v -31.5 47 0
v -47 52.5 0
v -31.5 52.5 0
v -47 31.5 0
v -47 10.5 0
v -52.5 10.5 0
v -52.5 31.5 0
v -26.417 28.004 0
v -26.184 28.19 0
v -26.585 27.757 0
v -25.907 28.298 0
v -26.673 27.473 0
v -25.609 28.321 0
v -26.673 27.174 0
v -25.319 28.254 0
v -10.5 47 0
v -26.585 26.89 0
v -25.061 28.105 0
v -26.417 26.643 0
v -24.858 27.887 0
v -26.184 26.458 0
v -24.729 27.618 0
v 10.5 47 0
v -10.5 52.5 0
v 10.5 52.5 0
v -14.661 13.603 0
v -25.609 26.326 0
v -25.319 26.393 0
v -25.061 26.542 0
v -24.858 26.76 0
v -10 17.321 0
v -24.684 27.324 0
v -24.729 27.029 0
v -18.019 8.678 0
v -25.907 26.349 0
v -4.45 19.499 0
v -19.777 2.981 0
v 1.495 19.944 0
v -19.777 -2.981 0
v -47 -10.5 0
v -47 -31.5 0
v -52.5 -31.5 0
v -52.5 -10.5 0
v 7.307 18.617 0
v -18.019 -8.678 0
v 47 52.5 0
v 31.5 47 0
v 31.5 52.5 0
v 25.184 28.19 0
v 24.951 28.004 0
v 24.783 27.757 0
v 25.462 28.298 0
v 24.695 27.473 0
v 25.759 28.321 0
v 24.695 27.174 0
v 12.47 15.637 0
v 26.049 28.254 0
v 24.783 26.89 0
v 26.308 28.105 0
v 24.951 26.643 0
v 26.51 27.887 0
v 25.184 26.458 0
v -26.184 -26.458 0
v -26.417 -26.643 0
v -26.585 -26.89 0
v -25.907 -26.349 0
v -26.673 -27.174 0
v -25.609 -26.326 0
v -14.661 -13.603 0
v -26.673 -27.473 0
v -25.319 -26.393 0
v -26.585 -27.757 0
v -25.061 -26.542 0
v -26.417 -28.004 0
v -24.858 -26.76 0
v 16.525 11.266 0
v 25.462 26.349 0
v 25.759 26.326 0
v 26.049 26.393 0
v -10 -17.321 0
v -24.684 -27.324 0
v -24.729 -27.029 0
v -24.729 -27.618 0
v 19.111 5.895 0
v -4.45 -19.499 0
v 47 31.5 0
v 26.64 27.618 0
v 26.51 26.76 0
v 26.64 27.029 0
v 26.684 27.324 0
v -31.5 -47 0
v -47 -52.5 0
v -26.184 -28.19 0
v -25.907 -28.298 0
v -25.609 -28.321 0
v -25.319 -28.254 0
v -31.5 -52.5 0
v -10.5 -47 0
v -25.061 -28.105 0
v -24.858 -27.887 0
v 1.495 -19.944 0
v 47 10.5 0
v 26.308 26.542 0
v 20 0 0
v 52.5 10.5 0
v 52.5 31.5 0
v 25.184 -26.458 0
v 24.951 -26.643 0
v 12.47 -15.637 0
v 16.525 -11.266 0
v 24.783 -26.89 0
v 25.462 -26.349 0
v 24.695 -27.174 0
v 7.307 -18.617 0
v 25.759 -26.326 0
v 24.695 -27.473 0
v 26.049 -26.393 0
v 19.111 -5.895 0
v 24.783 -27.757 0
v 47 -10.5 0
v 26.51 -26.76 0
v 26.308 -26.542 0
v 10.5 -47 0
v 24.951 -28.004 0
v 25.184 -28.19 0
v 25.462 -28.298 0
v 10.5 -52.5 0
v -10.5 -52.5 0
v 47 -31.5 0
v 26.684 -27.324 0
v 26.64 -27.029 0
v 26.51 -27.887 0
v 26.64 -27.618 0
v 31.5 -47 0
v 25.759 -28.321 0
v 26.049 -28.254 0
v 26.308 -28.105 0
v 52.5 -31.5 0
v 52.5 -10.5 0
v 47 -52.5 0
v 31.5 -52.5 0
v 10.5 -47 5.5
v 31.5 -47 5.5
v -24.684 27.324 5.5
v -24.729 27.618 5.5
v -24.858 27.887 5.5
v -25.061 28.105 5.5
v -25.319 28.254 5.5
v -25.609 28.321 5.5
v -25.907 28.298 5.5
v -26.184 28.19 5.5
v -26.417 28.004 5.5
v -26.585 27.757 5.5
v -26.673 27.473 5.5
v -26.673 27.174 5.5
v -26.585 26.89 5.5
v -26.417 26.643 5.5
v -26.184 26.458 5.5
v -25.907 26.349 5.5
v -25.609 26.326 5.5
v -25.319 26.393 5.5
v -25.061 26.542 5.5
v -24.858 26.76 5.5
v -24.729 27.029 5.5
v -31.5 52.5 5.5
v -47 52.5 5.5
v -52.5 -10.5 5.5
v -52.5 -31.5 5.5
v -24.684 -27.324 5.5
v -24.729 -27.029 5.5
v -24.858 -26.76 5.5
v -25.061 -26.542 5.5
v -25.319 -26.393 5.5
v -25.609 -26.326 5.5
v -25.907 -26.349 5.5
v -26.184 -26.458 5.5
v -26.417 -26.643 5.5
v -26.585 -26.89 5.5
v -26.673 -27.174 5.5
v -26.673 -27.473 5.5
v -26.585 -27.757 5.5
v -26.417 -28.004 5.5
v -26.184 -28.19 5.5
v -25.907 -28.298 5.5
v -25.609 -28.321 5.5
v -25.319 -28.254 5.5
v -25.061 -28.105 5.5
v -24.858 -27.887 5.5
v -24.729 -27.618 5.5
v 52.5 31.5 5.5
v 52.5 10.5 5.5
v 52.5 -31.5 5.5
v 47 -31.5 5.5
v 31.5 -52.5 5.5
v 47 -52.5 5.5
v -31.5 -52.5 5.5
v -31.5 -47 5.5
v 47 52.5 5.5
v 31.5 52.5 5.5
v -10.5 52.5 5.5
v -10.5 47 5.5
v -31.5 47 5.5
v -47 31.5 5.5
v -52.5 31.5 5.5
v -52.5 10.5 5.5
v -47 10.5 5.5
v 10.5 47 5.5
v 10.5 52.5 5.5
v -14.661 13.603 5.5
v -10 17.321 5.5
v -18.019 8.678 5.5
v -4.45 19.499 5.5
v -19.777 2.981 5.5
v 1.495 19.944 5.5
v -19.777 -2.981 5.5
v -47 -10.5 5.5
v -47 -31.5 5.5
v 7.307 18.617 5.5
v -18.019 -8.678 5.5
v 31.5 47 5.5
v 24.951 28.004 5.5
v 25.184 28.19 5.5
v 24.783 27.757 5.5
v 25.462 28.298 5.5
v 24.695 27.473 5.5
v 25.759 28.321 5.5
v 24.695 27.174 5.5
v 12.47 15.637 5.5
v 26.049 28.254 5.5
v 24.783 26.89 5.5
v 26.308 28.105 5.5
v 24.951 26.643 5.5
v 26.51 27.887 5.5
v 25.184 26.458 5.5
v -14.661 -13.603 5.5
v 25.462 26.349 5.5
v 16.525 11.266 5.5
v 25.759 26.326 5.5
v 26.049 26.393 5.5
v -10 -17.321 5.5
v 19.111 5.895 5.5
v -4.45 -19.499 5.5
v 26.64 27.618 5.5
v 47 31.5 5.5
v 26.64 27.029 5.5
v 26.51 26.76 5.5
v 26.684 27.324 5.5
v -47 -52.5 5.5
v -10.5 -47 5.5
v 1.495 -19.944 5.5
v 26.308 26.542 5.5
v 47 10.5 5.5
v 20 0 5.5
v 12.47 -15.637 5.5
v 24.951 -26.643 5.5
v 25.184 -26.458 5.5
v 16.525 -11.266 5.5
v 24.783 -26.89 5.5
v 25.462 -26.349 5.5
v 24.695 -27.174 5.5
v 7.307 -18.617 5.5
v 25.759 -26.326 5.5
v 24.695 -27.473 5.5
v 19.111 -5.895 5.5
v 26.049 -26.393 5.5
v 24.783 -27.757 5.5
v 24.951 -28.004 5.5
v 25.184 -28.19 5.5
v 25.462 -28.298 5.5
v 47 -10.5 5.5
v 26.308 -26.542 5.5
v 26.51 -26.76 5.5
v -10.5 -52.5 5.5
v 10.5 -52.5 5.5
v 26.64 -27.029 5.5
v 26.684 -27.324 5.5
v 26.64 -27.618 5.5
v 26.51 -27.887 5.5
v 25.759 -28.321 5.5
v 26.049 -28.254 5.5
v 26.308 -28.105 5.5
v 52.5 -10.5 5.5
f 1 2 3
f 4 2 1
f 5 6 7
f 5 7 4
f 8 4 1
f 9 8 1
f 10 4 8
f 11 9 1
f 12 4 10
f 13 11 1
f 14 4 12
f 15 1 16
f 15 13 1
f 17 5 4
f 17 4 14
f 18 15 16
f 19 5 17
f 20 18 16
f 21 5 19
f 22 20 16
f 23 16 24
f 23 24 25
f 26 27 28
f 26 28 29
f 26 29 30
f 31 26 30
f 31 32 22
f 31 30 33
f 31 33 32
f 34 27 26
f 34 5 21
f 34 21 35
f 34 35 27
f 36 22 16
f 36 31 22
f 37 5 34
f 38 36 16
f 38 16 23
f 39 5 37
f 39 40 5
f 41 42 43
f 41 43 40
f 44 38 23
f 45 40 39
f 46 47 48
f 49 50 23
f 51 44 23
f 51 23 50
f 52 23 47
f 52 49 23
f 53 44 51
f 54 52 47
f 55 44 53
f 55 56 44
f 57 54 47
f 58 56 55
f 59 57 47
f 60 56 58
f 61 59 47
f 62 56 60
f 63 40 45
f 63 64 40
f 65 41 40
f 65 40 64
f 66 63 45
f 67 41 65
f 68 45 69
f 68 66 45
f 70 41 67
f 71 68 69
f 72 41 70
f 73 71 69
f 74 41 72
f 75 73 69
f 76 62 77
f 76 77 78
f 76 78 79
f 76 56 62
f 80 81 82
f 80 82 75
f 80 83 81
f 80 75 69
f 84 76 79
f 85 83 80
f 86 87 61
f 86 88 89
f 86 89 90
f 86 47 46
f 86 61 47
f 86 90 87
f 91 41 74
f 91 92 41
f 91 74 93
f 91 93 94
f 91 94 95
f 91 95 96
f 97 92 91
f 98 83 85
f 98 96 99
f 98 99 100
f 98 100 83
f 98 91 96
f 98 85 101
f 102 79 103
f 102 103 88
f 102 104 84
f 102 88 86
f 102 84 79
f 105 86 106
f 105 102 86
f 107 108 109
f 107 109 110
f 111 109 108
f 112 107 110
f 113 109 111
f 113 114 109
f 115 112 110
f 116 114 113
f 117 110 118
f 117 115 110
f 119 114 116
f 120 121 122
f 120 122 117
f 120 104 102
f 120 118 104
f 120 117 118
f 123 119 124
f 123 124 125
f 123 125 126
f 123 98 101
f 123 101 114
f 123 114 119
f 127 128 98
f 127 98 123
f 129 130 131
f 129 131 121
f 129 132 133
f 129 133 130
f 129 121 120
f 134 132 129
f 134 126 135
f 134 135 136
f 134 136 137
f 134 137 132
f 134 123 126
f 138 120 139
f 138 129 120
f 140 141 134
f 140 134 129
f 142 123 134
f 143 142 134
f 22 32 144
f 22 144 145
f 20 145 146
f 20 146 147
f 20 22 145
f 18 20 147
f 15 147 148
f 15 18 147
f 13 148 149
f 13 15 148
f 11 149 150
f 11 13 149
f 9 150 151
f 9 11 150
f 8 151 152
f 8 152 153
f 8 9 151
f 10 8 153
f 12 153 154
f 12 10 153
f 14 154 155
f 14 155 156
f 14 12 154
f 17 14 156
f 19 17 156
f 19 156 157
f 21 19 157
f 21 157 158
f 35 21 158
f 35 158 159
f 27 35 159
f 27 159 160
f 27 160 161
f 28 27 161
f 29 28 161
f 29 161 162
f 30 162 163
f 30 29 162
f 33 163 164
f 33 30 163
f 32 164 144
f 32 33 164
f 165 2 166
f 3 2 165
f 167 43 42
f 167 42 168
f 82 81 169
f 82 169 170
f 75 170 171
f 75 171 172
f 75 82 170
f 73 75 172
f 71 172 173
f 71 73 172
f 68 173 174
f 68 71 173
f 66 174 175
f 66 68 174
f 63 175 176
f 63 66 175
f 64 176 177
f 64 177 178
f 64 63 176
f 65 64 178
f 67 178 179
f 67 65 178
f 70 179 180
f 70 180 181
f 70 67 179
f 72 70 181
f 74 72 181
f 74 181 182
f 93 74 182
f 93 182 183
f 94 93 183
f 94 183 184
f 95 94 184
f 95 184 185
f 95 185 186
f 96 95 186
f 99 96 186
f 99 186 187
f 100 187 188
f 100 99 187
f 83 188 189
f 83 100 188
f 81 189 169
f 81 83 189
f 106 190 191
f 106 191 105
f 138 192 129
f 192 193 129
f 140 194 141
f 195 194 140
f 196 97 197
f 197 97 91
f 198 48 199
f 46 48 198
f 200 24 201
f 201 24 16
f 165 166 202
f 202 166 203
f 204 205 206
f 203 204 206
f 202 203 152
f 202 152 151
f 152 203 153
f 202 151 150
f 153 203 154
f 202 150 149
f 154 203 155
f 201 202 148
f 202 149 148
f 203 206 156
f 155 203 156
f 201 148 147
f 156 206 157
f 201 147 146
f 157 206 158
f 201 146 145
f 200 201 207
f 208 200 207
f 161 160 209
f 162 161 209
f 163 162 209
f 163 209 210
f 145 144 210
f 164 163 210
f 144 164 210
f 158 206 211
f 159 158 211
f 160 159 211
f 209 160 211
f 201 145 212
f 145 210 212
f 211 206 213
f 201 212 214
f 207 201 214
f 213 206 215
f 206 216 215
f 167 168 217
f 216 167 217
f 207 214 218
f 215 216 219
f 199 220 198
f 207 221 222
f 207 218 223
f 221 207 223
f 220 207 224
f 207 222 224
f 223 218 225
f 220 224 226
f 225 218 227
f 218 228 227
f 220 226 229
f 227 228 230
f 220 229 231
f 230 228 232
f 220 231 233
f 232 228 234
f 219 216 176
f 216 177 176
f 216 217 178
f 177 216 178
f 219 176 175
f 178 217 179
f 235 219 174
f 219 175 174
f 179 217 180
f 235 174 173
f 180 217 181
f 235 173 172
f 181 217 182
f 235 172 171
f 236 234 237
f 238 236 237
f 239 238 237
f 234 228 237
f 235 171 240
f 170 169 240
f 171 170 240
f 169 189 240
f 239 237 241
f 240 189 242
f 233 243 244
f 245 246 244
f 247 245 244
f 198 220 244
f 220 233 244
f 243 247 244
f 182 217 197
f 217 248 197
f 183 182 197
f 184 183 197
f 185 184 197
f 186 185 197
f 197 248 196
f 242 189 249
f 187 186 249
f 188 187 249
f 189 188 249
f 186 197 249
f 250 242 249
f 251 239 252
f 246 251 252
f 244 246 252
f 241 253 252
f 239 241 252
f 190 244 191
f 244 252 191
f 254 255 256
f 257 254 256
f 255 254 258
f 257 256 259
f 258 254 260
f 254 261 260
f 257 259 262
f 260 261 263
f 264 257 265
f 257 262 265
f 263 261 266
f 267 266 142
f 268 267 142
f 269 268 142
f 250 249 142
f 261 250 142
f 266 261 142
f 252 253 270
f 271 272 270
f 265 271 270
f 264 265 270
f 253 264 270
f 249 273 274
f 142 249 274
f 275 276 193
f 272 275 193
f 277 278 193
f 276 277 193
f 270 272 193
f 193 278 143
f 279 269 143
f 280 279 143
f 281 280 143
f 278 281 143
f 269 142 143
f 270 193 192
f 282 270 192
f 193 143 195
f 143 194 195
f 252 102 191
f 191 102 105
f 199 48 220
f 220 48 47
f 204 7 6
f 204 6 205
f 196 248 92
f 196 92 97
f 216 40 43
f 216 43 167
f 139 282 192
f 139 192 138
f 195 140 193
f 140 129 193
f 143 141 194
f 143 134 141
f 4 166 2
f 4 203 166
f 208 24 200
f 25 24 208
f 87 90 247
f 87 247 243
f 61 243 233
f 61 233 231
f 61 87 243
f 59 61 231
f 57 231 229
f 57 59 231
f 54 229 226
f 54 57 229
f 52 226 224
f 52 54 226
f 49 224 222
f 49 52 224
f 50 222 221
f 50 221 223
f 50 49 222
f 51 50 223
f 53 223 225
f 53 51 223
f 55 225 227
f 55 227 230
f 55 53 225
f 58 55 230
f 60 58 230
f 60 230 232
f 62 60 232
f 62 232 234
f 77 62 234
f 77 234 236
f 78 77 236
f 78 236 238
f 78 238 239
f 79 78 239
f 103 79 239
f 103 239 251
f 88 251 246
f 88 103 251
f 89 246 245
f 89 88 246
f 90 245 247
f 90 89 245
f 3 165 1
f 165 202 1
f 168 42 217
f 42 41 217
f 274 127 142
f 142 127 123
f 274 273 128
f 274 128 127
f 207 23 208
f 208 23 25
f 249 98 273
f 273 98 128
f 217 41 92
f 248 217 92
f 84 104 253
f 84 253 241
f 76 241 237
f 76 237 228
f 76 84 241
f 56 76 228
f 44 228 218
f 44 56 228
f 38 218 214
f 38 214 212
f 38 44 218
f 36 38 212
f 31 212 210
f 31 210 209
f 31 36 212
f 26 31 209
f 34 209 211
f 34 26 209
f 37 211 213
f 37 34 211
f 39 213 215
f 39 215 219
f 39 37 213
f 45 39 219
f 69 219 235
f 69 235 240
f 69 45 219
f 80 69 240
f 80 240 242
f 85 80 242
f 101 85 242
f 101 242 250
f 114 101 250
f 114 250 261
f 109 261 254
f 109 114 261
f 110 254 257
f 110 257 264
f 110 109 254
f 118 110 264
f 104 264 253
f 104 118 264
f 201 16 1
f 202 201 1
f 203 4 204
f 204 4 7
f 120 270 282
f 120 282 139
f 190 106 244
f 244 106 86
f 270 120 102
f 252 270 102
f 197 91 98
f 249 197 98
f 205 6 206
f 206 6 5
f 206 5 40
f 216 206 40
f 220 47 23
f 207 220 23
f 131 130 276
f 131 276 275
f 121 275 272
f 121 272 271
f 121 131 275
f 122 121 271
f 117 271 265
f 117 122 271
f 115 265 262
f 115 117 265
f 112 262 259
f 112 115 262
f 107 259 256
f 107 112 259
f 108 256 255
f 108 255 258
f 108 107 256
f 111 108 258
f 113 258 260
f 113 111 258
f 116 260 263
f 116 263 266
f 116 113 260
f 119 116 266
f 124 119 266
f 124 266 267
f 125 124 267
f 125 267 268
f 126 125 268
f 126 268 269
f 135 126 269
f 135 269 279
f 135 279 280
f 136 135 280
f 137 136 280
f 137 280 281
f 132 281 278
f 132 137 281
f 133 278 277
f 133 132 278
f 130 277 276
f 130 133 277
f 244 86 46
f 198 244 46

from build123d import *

# Parameters (mm, degrees)
CROQUIS1_R              = 20
CROQUIS1_R_2            = 1
SALIENTE_EXTRUIR1_DEPTH = 5.5
CROQUIS2_W              = 5.5
CROQUIS2_H              = 21
SALIENTE_EXTRUIR2_DEPTH = 2.5
CROQUIS3_W              = 15.5
CROQUIS3_H              = 5.5
CROQUIS3_W_2            = 21
SALIENTE_EXTRUIR3_DEPTH = 2.5
CROQUIS4_W              = 5.5
CROQUIS4_H              = 21
SALIENTE_EXTRUIR4_DEPTH = 2.5
CROQUIS5_W              = 15.5
CROQUIS5_H              = 5.5
CROQUIS5_W_2            = 21
SALIENTE_EXTRUIR5_DEPTH = 2.5


with BuildPart() as part:
    # Croquis1 → Saliente-Extruir1 (new body)
    with BuildSketch(Plane.XY):
        Polygon((-47, 50), (-47, 31.5), (-50, 31.5), (-50, 10.5), (-47, 10.5), (-47, -10.5), (-50, -10.5), (-50, -31.5), (-47, -31.5), (-47, -50), (-31.5, -50), (-31.5, -47), (-10.5, -47), (-10.5, -50), (10.5, -50), (10.5, -47), (31.5, -47), (31.5, -50), (47, -50), (47, -31.5), (50, -31.5), (50, -10.5), (47, -10.5), (47, 10.5), (50, 10.5), (50, 31.5), (47, 31.5), (47, 50), (31.5, 50), (31.5, 47), (10.5, 47), (10.5, 50), (-10.5, 50), (-10.5, 47), (-31.5, 47), (-31.5, 50), align=None)
        Circle(CROQUIS1_R, mode=Mode.SUBTRACT)
        with Locations((25.684125329, 27.323537584)):
            Circle(CROQUIS1_R_2, mode=Mode.SUBTRACT)
        with Locations((25.684125329, -27.323537584)):
            Circle(CROQUIS1_R_2, mode=Mode.SUBTRACT)
        with Locations((-25.684125329, 27.323537584)):
            Circle(CROQUIS1_R_2, mode=Mode.SUBTRACT)
        with Locations((-25.684125329, -27.323537584)):
            Circle(CROQUIS1_R_2, mode=Mode.SUBTRACT)
    extrude(amount=SALIENTE_EXTRUIR1_DEPTH)

    # Croquis2 → Saliente-Extruir2 (add)
    with BuildSketch(Plane(origin=(50, 0, 0), x_dir=(0, 0, -1), z_dir=(1, 0, 0))):
        with Locations((-2.75, -21)):
            Rectangle(CROQUIS2_W, CROQUIS2_H)
        with Locations((-2.75, 21)):
            Rectangle(CROQUIS2_W, CROQUIS2_H)
    extrude(amount=SALIENTE_EXTRUIR2_DEPTH)

    # Croquis3 → Saliente-Extruir3 (add)
    with BuildSketch(Plane.XZ.offset(50)):
        with Locations((39.25, 2.75)):
            Rectangle(CROQUIS3_W, CROQUIS3_H)
        with Locations((0, 2.75)):
            Rectangle(CROQUIS3_W_2, CROQUIS3_H)
        with Locations((-39.25, 2.75)):
            Rectangle(CROQUIS3_W, CROQUIS3_H)
    extrude(amount=SALIENTE_EXTRUIR3_DEPTH)

    # Croquis4 → Saliente-Extruir4 (add)
    with BuildSketch(Plane.ZY.offset(50)):
        with Locations((2.75, -21)):
            Rectangle(CROQUIS4_W, CROQUIS4_H)
        with Locations((2.75, 21)):
            Rectangle(CROQUIS4_W, CROQUIS4_H)
    extrude(amount=SALIENTE_EXTRUIR4_DEPTH)

    # Croquis5 → Saliente-Extruir5 (add)
    with BuildSketch(Plane(origin=(0, 50, 0), x_dir=(1, 0, 0), z_dir=(0, 1, 0))):
        with Locations((-39.25, -2.75)):
            Rectangle(CROQUIS5_W, CROQUIS5_H)
        with Locations((0, -2.75)):
            Rectangle(CROQUIS5_W_2, CROQUIS5_H)
        with Locations((39.25, -2.75)):
            Rectangle(CROQUIS5_W, CROQUIS5_H)
    extrude(amount=SALIENTE_EXTRUIR5_DEPTH)


solid = part.part
